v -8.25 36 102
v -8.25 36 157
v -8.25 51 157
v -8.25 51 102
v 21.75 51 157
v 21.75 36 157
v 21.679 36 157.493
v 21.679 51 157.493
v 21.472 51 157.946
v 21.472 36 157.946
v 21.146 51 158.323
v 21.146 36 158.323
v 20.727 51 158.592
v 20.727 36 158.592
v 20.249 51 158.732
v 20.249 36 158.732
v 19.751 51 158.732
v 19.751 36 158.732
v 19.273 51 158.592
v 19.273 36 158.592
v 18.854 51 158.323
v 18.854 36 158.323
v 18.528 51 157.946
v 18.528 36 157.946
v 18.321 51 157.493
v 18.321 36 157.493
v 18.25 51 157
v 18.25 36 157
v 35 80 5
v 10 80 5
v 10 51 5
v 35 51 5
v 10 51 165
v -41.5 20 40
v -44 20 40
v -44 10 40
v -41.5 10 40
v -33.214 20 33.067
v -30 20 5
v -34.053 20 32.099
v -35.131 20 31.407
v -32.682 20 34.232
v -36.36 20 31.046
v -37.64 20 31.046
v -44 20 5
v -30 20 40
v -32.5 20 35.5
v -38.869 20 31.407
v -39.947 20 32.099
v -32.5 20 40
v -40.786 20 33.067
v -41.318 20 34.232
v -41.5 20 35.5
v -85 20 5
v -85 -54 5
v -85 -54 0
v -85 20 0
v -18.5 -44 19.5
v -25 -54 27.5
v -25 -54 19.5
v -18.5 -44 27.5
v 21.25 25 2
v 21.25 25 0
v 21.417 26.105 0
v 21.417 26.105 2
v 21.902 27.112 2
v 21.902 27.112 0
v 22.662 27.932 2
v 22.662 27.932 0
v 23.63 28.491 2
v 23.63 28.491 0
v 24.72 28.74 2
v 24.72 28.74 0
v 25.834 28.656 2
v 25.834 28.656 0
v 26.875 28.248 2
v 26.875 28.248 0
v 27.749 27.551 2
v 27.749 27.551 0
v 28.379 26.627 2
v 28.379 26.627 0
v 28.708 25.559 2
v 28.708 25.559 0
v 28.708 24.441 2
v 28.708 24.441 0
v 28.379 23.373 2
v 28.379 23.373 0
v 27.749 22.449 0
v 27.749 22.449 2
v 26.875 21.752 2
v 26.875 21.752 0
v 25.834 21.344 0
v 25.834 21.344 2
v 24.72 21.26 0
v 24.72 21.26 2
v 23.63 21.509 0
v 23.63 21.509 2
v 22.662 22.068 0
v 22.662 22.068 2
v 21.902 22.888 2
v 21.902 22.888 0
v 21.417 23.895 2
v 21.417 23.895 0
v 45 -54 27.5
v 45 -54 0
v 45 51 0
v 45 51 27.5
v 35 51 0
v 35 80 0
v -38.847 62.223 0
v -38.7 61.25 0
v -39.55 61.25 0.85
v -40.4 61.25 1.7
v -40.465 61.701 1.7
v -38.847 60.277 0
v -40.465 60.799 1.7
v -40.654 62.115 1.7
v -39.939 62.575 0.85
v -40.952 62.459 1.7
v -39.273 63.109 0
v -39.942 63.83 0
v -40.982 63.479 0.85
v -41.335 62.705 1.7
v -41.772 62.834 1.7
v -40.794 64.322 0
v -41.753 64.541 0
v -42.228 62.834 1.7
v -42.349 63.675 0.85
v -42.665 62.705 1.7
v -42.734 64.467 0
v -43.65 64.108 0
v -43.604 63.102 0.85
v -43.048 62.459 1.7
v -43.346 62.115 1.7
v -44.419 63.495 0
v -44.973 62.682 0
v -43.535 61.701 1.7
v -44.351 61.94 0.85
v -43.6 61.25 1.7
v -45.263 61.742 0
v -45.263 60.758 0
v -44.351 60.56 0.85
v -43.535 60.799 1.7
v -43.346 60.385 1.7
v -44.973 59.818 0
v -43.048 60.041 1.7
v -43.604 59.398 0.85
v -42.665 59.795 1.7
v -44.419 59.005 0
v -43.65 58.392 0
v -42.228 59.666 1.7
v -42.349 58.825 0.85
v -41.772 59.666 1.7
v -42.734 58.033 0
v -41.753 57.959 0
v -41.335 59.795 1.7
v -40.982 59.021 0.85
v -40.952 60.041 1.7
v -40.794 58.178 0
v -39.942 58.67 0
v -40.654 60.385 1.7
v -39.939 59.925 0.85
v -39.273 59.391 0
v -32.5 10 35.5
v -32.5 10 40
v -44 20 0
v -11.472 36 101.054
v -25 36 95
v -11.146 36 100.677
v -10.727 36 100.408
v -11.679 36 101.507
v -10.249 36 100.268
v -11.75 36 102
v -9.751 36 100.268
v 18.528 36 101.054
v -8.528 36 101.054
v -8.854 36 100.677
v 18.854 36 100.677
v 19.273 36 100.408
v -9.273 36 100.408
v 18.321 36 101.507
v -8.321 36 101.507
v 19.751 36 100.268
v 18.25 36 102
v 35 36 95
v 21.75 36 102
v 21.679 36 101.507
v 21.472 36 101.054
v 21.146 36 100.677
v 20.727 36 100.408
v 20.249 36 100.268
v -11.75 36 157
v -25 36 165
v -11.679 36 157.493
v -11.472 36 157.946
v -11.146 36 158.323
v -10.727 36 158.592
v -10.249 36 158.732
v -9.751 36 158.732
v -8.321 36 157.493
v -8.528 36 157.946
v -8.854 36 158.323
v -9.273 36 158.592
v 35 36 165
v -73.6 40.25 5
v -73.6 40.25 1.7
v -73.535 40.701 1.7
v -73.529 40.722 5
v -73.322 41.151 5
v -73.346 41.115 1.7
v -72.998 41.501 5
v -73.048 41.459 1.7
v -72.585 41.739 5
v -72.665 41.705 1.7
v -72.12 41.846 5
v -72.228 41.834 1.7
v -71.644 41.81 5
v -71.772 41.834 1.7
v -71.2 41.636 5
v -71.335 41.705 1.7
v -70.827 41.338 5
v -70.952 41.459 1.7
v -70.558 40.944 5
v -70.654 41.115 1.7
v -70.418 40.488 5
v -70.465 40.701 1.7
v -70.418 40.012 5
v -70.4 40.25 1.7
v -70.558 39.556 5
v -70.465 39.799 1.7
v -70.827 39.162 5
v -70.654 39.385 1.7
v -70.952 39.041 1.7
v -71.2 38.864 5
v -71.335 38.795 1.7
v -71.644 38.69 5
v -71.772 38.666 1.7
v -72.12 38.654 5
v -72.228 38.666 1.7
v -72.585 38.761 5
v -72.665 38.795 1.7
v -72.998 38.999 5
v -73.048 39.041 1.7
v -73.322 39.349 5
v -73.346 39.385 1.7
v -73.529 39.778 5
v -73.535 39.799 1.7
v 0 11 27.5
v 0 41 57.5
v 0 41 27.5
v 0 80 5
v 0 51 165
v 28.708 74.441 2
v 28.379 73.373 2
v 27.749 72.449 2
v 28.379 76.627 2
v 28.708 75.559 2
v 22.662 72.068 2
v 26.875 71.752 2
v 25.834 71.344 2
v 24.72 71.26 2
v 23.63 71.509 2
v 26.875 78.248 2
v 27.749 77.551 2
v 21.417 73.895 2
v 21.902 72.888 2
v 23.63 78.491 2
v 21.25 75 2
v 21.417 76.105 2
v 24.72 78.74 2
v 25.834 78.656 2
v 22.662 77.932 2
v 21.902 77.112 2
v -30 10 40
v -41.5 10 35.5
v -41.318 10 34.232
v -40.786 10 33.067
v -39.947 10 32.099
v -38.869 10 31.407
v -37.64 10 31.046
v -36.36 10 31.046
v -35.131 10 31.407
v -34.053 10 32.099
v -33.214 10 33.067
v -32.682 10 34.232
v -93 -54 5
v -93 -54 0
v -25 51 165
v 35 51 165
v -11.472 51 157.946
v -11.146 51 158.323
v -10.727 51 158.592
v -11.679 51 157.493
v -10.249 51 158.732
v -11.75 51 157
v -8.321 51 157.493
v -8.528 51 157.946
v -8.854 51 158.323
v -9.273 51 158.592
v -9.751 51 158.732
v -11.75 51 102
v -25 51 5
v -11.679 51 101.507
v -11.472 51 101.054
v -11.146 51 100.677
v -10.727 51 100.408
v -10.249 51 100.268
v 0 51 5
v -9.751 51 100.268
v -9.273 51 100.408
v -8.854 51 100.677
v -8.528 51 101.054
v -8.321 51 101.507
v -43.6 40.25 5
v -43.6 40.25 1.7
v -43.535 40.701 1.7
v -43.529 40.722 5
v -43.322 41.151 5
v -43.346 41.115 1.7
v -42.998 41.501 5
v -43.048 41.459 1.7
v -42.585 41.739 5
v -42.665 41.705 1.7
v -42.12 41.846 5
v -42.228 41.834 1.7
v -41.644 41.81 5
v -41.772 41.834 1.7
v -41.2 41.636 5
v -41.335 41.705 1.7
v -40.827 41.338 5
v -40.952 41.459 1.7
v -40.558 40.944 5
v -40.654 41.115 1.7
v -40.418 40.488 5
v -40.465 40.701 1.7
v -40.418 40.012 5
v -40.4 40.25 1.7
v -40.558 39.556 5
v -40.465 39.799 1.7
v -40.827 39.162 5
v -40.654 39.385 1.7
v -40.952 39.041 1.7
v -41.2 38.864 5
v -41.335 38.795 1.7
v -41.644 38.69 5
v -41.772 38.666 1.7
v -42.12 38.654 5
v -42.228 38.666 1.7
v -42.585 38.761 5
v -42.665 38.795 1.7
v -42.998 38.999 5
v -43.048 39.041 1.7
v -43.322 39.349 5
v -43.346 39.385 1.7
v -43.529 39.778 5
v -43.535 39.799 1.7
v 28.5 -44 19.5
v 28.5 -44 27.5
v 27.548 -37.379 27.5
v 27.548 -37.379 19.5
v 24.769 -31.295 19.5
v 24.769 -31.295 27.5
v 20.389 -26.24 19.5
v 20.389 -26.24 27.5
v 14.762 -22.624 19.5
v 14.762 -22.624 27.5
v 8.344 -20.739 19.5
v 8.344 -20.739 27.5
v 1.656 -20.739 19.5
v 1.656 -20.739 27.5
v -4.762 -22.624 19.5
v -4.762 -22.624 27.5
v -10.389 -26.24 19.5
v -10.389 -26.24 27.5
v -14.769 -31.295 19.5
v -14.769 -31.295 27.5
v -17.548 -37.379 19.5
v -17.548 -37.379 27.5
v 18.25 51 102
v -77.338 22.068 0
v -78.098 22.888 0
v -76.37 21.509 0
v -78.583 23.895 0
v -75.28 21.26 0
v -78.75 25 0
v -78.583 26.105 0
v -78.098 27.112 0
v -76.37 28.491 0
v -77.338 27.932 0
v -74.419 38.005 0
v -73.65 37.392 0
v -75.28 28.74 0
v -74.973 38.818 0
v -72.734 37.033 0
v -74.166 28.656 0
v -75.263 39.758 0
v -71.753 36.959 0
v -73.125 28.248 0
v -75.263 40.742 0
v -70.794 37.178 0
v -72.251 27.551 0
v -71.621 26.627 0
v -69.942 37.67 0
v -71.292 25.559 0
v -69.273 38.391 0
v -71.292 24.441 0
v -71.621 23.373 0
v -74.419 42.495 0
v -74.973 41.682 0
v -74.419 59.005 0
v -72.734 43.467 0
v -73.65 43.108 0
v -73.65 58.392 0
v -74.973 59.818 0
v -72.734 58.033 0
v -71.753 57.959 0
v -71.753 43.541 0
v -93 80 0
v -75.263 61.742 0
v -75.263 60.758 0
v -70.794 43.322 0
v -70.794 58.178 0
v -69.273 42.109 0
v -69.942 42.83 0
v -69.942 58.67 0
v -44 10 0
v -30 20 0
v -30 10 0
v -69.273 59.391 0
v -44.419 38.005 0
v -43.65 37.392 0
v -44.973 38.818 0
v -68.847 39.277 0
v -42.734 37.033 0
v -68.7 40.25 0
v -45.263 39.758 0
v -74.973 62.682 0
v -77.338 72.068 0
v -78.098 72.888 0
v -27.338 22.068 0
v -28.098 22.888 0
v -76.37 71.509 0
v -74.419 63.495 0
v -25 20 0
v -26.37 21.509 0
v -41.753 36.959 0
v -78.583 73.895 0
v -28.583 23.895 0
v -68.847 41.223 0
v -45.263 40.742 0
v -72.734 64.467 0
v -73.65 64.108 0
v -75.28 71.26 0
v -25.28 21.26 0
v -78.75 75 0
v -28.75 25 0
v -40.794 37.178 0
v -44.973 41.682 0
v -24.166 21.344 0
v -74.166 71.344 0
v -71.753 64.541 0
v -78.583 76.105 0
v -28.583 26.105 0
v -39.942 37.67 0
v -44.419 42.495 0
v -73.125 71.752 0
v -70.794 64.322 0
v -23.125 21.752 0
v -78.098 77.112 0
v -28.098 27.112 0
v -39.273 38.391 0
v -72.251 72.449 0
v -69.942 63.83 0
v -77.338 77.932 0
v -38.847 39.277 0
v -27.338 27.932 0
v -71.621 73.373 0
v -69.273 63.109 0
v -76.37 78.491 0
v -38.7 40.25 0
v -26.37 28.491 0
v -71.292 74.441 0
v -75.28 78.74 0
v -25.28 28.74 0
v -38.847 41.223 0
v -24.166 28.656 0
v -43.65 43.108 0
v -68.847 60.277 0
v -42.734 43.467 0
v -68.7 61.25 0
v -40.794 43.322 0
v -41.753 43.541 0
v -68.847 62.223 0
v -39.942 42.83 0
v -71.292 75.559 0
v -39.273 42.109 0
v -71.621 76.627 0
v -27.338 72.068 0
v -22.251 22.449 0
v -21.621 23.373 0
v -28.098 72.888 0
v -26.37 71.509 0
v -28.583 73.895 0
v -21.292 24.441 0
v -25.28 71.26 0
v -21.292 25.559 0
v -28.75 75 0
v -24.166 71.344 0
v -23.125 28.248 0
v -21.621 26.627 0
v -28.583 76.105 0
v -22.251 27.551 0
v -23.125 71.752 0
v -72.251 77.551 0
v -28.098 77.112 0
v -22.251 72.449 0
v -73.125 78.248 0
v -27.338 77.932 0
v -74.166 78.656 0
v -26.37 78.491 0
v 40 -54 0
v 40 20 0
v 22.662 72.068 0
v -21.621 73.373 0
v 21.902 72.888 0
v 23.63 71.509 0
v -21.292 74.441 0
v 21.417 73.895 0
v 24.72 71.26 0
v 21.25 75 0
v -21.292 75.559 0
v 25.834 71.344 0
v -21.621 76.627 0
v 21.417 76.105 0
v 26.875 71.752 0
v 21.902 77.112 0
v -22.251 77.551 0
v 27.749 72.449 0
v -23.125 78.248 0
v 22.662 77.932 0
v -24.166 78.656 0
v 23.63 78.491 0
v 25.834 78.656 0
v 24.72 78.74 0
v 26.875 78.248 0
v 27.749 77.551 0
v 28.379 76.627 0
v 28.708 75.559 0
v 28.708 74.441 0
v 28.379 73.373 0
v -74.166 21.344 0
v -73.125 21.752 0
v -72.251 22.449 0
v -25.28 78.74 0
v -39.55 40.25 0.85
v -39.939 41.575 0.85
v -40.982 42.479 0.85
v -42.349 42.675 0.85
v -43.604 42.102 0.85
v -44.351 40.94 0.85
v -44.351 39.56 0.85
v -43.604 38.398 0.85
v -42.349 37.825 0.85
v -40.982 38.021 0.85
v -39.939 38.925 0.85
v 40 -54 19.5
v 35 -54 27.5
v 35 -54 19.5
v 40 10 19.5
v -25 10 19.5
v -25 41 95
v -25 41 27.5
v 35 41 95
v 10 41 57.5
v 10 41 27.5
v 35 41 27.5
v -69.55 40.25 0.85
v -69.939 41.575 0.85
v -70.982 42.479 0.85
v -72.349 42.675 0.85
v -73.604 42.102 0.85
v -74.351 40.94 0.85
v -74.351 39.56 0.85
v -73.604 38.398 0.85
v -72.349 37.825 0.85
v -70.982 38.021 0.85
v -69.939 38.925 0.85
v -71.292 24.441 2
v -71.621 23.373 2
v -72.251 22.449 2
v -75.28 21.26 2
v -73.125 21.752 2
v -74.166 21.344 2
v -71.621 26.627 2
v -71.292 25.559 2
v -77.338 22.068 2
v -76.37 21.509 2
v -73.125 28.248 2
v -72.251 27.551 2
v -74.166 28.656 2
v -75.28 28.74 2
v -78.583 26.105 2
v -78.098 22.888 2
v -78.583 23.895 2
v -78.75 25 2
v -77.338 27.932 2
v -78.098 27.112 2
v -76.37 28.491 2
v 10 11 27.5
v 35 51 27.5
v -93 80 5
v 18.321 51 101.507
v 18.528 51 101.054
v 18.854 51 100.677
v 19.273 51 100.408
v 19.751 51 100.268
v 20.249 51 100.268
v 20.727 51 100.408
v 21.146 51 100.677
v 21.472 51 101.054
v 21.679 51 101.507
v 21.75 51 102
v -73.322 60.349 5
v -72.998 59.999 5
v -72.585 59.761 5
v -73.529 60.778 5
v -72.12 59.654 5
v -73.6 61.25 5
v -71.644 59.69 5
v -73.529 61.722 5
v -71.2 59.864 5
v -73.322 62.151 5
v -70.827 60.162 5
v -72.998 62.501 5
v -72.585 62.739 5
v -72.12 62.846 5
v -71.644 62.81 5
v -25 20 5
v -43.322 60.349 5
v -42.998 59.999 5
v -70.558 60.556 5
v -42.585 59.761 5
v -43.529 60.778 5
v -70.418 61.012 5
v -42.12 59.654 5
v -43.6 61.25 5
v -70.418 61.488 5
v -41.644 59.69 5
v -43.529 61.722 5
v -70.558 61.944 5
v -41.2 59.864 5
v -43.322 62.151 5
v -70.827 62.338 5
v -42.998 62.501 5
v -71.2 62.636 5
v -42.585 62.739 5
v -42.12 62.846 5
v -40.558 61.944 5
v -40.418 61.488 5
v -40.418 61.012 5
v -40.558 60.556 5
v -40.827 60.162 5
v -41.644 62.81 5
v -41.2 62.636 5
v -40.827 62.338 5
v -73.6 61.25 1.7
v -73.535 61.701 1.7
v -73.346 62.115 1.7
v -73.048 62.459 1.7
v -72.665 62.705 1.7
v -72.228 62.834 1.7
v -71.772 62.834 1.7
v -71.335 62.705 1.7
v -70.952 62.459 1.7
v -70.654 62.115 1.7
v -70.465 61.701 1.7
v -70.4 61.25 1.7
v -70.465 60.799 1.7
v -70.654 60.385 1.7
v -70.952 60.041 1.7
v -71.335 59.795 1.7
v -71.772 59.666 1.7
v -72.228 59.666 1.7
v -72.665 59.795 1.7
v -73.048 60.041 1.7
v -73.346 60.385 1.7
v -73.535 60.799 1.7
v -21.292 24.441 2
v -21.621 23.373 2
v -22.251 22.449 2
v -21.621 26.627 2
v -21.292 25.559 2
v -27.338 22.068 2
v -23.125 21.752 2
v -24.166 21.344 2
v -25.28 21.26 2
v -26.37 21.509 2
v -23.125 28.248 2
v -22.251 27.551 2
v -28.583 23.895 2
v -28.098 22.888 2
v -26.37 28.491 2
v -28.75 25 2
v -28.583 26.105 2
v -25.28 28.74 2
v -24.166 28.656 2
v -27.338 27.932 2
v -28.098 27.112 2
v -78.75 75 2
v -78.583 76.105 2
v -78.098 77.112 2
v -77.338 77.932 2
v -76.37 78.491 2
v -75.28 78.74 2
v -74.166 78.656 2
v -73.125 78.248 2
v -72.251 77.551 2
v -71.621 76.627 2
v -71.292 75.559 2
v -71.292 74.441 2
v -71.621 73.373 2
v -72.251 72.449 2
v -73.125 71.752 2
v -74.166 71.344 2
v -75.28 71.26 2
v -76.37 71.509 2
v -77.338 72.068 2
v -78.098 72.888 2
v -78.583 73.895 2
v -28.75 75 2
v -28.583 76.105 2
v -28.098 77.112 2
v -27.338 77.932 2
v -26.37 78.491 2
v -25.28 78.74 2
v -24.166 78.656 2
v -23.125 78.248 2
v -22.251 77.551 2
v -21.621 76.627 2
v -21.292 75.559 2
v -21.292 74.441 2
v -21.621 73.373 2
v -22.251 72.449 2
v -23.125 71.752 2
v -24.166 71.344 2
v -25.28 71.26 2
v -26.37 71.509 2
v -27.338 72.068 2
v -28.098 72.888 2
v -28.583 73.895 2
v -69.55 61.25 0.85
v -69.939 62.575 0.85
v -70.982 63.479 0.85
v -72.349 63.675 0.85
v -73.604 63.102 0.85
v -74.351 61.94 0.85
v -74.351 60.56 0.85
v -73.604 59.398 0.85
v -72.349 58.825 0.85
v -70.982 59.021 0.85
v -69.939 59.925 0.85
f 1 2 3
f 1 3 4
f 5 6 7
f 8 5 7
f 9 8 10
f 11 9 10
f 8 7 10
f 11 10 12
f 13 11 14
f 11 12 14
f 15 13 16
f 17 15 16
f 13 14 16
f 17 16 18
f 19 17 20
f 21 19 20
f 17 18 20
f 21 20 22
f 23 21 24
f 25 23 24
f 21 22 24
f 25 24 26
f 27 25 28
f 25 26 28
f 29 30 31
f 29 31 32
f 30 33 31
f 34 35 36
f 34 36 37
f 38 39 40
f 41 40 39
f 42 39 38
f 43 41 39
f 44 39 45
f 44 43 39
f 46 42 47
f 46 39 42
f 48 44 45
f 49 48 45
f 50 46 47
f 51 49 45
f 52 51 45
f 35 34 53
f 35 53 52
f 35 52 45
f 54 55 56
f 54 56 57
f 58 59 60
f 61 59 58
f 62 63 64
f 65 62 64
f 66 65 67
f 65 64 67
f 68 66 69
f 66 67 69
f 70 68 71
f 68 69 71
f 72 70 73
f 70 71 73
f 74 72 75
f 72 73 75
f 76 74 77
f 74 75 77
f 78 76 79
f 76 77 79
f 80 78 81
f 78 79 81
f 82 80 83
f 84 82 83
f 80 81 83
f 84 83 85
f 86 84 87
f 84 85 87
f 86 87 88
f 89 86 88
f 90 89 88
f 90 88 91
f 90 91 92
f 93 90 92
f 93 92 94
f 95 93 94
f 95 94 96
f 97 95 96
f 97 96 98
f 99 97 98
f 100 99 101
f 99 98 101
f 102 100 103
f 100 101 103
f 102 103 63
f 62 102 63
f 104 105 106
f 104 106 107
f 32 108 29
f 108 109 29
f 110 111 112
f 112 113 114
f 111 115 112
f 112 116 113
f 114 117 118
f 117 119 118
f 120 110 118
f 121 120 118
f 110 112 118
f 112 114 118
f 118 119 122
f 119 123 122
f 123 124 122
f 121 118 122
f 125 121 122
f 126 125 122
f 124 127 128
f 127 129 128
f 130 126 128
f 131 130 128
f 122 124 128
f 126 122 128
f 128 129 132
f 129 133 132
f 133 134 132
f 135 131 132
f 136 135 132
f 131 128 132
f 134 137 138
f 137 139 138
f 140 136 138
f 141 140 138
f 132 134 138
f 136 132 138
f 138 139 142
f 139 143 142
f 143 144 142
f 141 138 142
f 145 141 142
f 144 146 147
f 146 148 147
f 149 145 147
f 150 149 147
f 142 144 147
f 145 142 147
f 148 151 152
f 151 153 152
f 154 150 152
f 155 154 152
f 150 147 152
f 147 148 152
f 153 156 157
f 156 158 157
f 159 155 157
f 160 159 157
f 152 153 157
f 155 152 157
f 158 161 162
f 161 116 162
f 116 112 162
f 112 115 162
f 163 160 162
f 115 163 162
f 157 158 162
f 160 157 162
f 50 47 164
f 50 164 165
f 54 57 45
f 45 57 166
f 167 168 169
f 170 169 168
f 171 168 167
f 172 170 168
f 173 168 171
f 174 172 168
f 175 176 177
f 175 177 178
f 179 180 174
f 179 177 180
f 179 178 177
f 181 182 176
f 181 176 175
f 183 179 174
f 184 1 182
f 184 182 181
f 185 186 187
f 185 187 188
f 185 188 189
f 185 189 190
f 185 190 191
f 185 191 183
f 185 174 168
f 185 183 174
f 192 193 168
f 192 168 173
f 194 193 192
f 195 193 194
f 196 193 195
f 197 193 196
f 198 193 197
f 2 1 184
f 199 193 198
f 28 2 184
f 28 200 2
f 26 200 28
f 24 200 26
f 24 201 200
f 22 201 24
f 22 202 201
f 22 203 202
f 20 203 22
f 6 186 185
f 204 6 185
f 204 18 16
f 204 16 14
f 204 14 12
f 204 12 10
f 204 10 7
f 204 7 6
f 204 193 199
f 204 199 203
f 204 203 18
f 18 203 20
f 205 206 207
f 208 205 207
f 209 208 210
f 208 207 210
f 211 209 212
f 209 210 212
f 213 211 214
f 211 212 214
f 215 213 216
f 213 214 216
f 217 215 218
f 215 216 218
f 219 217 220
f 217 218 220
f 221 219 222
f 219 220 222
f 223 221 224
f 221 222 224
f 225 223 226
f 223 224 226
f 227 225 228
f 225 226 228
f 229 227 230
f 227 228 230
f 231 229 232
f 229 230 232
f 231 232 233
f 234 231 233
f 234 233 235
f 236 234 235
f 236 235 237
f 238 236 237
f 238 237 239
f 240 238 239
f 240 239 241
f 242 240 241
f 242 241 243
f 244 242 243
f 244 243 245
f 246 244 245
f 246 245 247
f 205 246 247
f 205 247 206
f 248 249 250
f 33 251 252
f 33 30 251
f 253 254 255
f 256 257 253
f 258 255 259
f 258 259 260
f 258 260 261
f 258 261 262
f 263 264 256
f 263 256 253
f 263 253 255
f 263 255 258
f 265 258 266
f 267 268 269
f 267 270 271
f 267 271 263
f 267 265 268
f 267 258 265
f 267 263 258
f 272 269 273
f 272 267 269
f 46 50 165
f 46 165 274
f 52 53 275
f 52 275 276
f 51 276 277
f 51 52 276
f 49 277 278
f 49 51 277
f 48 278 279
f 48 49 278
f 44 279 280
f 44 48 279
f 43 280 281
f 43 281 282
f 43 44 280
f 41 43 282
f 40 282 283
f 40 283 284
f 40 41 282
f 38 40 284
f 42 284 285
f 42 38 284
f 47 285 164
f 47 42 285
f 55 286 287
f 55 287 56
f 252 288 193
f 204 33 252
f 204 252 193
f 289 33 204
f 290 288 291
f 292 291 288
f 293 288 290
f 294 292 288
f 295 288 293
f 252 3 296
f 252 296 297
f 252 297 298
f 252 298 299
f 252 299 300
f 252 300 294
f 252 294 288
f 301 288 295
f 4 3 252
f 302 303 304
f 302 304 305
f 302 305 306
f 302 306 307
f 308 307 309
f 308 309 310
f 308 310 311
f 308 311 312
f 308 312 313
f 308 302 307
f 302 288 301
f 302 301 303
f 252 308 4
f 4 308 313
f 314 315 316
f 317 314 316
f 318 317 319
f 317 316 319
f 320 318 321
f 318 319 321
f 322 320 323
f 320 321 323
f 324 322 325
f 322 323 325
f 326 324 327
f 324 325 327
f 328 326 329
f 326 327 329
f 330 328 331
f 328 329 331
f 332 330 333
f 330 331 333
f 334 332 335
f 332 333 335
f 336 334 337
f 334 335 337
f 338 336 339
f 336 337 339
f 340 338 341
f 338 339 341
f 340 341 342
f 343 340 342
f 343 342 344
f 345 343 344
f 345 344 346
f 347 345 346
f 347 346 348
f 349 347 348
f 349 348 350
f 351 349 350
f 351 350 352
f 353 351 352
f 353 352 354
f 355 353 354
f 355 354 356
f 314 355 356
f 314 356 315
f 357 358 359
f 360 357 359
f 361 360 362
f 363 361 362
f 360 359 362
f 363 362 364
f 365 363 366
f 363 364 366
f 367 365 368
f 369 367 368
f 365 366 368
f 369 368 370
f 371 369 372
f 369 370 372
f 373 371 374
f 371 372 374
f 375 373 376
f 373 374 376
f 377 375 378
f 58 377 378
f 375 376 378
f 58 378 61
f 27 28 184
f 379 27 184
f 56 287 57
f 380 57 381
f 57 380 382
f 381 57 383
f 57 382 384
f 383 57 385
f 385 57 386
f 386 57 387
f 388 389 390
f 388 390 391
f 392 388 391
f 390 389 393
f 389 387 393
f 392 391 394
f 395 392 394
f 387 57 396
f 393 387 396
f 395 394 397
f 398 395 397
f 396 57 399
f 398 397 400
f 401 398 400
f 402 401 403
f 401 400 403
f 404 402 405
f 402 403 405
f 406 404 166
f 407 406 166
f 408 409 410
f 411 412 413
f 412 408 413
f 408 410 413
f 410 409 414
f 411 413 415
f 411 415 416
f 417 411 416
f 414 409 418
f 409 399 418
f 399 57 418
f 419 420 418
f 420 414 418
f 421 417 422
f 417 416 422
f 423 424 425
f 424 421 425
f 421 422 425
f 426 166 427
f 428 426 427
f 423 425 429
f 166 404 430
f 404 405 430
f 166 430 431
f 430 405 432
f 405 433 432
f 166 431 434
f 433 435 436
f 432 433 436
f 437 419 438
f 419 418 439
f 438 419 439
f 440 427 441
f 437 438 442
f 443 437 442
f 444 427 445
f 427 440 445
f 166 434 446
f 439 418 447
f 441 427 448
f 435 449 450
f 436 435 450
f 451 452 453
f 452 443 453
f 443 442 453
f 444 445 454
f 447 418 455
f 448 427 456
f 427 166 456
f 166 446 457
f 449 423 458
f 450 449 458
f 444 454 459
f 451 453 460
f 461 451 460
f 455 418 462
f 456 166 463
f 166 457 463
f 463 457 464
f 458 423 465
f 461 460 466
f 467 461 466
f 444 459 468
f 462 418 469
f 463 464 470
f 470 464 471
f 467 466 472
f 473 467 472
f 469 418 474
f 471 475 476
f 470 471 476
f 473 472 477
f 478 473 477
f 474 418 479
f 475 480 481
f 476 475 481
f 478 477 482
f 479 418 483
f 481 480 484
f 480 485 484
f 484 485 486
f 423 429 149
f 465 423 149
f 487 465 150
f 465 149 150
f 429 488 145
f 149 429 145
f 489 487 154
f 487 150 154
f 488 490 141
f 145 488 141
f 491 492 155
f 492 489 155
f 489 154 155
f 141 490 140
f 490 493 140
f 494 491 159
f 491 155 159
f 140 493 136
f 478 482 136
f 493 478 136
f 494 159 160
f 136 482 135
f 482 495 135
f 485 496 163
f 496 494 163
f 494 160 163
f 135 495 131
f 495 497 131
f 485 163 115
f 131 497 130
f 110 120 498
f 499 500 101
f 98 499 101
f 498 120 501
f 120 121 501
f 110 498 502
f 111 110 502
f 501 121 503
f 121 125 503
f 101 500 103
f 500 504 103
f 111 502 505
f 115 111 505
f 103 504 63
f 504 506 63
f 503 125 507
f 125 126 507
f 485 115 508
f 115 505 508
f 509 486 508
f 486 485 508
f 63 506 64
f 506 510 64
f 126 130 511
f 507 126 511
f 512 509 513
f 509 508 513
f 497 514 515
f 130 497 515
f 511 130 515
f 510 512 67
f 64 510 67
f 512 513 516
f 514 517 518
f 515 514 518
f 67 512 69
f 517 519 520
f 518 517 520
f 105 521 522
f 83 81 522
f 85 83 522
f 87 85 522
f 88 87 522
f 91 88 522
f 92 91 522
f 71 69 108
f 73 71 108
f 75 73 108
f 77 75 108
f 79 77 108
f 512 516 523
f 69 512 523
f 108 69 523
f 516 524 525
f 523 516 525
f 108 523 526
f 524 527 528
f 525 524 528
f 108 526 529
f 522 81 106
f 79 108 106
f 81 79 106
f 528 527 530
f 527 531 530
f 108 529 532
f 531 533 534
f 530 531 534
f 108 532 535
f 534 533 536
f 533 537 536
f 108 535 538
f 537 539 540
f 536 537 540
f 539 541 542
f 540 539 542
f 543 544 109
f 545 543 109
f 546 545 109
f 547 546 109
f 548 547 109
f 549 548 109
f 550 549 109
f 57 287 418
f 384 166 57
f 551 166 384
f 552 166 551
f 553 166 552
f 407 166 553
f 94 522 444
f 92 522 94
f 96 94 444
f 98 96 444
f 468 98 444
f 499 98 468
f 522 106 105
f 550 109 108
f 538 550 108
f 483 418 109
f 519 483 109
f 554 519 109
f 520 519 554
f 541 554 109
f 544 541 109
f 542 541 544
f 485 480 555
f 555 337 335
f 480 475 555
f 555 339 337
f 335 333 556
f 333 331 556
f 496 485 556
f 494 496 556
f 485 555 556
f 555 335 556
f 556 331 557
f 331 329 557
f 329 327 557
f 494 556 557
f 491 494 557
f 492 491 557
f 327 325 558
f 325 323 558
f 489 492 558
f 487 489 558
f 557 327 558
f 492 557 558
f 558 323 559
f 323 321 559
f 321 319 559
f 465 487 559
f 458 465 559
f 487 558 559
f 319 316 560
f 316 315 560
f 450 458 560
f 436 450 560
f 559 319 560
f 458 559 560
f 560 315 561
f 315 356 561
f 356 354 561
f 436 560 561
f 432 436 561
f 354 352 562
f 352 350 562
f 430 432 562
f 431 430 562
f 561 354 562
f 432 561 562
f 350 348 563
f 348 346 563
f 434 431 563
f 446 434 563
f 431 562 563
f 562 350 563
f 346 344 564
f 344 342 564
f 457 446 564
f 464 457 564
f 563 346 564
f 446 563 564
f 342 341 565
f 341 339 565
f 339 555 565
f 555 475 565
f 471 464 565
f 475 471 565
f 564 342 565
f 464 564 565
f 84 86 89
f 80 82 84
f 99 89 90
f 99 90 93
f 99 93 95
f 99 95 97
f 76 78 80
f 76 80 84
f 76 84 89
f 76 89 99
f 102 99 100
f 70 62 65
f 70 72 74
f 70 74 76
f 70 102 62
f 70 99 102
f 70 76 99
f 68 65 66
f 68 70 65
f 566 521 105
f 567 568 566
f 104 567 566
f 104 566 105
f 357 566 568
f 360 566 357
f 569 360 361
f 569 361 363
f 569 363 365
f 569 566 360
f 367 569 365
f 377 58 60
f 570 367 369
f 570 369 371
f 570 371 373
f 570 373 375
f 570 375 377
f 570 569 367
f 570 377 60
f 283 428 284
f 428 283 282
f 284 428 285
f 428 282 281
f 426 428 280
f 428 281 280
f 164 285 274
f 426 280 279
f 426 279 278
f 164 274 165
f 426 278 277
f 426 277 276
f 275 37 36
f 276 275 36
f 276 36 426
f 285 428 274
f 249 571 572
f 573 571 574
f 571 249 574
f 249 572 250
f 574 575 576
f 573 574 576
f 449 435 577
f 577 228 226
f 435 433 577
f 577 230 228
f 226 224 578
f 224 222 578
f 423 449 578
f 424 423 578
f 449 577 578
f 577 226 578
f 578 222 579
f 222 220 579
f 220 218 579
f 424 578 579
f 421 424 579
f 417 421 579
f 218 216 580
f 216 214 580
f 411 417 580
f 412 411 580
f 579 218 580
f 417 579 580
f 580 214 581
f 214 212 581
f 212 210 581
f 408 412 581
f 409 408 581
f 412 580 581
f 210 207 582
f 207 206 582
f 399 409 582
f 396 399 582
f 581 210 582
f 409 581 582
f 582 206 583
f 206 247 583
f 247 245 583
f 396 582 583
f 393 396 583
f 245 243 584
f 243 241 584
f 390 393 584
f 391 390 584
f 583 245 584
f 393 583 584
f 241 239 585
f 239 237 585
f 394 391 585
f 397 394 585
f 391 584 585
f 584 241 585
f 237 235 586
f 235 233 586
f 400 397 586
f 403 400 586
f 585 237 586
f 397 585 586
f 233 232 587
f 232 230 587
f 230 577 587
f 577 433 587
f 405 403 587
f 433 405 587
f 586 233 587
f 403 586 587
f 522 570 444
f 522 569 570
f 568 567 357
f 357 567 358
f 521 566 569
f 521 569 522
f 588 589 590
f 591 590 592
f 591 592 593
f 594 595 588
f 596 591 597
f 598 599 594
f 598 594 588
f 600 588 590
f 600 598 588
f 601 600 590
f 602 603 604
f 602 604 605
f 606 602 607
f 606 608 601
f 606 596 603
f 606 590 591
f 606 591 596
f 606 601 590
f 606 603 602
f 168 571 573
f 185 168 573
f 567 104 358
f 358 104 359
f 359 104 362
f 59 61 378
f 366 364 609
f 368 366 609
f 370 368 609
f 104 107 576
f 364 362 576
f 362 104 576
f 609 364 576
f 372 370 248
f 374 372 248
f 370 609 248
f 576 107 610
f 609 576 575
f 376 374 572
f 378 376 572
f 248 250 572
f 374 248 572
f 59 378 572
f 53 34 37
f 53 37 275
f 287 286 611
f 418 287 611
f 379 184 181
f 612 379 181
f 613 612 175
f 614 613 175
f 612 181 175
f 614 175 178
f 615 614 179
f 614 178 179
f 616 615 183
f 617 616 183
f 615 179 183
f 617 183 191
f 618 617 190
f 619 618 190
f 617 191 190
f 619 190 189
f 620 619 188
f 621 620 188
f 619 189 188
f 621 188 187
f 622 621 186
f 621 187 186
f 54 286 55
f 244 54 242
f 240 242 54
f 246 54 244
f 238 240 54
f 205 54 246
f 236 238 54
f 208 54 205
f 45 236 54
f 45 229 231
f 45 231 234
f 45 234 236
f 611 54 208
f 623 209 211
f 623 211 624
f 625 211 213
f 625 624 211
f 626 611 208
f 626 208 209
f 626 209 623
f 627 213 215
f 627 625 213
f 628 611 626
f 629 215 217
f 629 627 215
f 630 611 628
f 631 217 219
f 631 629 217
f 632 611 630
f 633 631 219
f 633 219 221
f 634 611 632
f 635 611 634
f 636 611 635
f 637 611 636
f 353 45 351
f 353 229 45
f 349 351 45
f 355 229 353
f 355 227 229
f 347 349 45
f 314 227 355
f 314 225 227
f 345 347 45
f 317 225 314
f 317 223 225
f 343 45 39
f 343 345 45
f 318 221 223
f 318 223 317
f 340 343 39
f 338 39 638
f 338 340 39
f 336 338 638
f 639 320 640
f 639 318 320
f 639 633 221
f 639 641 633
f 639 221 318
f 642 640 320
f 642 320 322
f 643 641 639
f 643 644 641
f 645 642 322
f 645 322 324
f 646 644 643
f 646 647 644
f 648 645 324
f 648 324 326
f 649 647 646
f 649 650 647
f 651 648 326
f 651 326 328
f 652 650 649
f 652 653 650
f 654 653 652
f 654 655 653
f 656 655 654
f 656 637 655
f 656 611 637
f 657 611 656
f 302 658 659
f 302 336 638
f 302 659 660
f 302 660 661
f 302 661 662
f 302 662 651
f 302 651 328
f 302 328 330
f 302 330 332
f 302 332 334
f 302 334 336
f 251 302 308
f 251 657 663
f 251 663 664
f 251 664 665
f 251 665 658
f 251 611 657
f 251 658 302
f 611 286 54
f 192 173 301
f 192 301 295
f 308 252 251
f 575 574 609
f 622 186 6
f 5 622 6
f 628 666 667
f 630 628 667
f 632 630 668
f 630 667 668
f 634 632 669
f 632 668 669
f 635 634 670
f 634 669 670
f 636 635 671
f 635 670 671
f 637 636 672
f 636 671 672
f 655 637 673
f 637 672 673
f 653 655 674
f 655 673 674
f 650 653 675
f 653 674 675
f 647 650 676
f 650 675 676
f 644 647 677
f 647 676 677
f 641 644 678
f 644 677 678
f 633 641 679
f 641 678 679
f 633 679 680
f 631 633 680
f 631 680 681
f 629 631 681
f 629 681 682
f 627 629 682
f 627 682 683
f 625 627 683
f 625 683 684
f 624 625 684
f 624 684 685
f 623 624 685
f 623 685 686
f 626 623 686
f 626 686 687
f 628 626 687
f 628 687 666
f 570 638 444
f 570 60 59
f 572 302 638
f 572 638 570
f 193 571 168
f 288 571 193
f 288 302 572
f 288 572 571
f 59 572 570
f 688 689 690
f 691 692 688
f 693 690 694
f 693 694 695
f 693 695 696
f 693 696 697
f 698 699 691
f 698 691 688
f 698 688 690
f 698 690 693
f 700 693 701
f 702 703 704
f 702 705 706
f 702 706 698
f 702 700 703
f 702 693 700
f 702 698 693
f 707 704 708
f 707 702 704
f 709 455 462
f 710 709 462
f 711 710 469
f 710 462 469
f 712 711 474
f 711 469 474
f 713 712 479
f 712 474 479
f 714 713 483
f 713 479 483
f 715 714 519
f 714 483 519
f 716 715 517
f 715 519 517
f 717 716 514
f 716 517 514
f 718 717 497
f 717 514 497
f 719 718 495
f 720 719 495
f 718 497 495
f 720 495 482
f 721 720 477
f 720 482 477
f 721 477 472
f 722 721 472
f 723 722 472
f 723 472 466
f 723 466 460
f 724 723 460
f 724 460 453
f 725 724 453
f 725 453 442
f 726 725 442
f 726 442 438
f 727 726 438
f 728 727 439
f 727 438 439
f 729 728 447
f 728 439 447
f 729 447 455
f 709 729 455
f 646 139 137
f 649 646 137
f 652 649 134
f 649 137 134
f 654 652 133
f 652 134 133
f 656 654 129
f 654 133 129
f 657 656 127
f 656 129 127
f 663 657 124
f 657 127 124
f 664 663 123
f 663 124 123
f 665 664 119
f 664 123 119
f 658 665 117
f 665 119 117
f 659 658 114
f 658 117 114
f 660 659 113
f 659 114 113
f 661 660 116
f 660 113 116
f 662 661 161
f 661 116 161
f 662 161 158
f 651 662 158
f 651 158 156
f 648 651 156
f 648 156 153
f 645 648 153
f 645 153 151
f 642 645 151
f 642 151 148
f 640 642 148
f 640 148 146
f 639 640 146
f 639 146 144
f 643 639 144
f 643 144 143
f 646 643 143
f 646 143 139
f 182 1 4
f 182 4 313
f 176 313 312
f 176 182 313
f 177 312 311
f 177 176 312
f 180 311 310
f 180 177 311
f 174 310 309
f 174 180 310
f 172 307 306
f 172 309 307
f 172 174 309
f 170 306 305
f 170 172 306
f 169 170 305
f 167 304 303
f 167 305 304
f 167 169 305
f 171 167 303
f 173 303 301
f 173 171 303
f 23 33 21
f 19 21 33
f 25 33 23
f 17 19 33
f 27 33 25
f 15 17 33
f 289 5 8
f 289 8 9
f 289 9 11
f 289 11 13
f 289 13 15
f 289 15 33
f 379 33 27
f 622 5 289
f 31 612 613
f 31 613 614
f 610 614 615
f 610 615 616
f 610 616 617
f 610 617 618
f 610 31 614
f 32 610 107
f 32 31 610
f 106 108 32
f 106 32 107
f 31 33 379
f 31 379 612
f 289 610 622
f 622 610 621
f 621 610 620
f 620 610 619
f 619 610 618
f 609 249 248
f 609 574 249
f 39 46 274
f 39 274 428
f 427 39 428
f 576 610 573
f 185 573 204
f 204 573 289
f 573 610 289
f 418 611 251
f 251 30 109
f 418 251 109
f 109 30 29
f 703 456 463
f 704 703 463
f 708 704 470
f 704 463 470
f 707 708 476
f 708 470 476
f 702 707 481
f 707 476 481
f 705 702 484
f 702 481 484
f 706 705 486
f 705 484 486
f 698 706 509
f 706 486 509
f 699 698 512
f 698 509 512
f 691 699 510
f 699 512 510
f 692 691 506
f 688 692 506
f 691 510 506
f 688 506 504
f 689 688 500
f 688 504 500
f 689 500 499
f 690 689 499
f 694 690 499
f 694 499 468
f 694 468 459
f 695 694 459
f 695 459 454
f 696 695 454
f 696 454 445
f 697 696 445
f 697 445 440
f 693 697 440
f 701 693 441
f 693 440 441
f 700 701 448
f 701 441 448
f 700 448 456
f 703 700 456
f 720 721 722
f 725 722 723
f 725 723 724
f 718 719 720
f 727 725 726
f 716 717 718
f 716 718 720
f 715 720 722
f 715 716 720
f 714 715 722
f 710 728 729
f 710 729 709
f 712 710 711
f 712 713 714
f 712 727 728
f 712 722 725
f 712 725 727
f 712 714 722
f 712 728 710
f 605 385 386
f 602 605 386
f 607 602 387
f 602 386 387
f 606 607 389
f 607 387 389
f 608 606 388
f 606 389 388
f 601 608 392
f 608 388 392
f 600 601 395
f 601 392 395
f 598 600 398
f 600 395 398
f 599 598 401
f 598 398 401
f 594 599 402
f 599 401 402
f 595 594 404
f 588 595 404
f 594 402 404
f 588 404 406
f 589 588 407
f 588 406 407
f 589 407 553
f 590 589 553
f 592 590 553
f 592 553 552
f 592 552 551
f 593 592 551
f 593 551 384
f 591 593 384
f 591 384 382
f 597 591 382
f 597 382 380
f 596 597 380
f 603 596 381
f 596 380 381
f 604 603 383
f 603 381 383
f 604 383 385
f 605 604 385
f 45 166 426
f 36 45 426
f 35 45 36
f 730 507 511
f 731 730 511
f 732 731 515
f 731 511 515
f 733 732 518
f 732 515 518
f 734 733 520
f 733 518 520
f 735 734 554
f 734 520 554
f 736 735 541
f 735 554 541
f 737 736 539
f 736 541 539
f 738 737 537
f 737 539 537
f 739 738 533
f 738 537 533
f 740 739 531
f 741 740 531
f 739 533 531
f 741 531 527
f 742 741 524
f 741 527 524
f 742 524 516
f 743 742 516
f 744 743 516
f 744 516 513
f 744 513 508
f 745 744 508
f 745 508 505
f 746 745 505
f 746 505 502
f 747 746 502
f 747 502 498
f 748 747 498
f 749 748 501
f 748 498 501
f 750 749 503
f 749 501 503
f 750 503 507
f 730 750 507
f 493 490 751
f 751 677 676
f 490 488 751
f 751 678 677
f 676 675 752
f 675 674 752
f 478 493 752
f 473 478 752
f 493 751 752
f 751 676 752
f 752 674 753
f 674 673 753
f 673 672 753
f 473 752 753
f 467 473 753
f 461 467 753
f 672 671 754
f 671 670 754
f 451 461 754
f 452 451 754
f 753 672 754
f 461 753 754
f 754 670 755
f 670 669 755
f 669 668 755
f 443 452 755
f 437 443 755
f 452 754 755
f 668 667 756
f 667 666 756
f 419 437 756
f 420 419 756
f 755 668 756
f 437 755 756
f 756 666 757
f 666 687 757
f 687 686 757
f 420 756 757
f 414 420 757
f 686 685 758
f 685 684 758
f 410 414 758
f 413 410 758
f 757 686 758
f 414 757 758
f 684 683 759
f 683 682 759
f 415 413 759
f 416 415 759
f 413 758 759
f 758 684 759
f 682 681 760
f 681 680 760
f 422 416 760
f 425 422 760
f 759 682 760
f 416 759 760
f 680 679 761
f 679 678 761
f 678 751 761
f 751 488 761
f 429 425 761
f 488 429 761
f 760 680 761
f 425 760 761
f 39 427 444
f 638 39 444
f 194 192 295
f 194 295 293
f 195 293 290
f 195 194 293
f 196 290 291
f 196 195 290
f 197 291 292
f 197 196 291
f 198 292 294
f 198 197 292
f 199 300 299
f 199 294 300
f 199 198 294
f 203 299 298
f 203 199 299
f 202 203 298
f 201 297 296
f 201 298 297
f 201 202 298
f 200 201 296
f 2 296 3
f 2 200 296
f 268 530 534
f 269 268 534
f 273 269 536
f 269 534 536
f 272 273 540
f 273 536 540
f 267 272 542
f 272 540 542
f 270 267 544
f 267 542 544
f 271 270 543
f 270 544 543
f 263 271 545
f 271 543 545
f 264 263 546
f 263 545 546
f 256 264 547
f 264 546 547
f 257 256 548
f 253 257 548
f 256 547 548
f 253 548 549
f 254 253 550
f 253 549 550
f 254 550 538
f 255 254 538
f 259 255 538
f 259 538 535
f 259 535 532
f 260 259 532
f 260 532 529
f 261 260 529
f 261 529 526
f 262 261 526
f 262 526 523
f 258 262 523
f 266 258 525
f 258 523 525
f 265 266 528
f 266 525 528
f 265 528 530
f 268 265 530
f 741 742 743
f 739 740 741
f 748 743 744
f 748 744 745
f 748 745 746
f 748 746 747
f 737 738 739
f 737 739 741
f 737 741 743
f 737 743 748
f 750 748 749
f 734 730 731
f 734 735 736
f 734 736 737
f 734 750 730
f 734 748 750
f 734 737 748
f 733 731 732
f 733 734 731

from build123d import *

# Parameters (mm, degrees)
SKETCH_1_W                   = 120
SKETCH_1_H                   = 60
EXTRUDE_1_DEPTH              = 5
SKETCH_3_W                   = 60
SKETCH_3_H                   = 8
EXTRUDE_3_DEPTH              = 60
EXTRUDE_6_DEPTH              = 10
SKETCH_11_R                  = 1.6
CUT_EXTRUDE_3_DEPTH          = 124.668912828
SKETCH_12_R                  = 1.6
CUT_EXTRUDE_4_DEPTH          = 134.603892159
SKETCH_18_R                  = 3.75
CUT_EXTRUDE_7_DEPTH          = 2
SKETCH_20_W                  = 60
SKETCH_20_H                  = 90
EXTRUDE_8_DEPTH              = 8
SKETCH_22_W                  = 60
SKETCH_22_H                  = 50
EXTRUDE_9_DEPTH              = 5
CUT_EXTRUDE_8_DEPTH          = 191.131533418
CUT_EXTRUDE_8_DEPTH_BACK     = 191.131533418
SKETCH_23_W                  = 60
SKETCH_23_H                  = 10
EXTRUDE_10_DEPTH             = 160
CUT_EXTRUDE_9_DEPTH          = 190.660222503
SKETCH_25_W                  = 150
SKETCH_25_H                  = 13
CUT_EXTRUDE_10_DEPTH         = 193.937813816
SKETCH_26_W                  = 60
SKETCH_26_H                  = 8
EXTRUDE_11_DEPTH             = 85
SKETCH_27_R                  = 23.5
CUT_EXTRUDE_11_DEPTH         = 181.364214854
EXTRUDE_12_DEPTH             = 8
SKETCH_29_W                  = 60
SKETCH_29_H                  = 70
EXTRUDE_13_DEPTH             = 5
CUT_EXTRUDE_12_DEPTH         = 207.276513447
HOLE_WIZARD_M3_1_D           = 3.2
HOLE_WIZARD_M3_1_CSINK_D     = 6.6
HOLE_WIZARD_M3_1_CSINK_ANGLE = 90
SKETCH_33_W                  = 14.5
SKETCH_33_H                  = 21
EXTRUDE_14_DEPTH             = 60
EXTRUDE_15_DEPTH             = 60
EXTRUDE_18_DEPTH             = 5
EXTRUDE_19_DEPTH             = 5
SKETCH_38_W                  = 10
SKETCH_38_H                  = 105
EXTRUDE_20_DEPTH             = 8
SKETCH_40_W                  = 10
SKETCH_40_H                  = 19.5
EXTRUDE_21_DEPTH             = 105
CUT_EXTRUDE_13_DEPTH         = 5
SKETCH_42_W                  = 8
SKETCH_42_H                  = 134
EXTRUDE_22_DEPTH             = 5
EXTRUDE_17_DEPTH             = 5


with BuildPart() as part:
    # 草图1 → 凸台-拉伸1 (new body)
    with BuildSketch(Plane.XY):
        with Locations((-25, 50)):
            Rectangle(SKETCH_1_W, SKETCH_1_H)
    extrude(amount=EXTRUDE_1_DEPTH)

    # 草图3 → 凸台-拉伸3 (add)
    with BuildSketch(Plane.XY.offset(5)):
        with Locations((5, 76)):
            Rectangle(SKETCH_3_W, SKETCH_3_H)
    extrude(amount=EXTRUDE_3_DEPTH)

    # 草图9 → 凸台-拉伸6 (add)
    with BuildSketch(Plane.XZ.offset(-20)):
        with BuildLine():
            Line((-32.5, 0), (-41.5, 0))
            Line((-41.5, 0), (-44, 0))
            Line((-44, 0), (-44, 40))
            Line((-44, 40), (-41.5, 40))
            Line((-41.5, 40), (-41.5, 35.5))
            ThreePointArc((-41.5, 35.5), (-37, 31), (-32.5, 35.5))
            Line((-32.5, 35.5), (-32.5, 40))
            Line((-32.5, 40), (-30, 40))
            Line((-30, 40), (-30, 0))
            Line((-30, 0), (-32.5, 0))
        make_face()
    extrude(amount=EXTRUDE_6_DEPTH)

    # 草图11 → 切除-拉伸3 (cut, through all)
    with BuildSketch(Plane(origin=(0, 72, 0), x_dir=(-1, 0, 0), z_dir=(0, -1, 0))):
        with Locations(Location((-20, -52.088110118, 0), (0, 0, 90))):
            Circle(SKETCH_11_R)
        with Locations(Location((10, -28.088110118, 0), (0, 0, 90))):
            Circle(SKETCH_11_R)
        with Locations(Location((-20, -28.088110118, 0), (0, 0, 90))):
            Circle(SKETCH_11_R)
        with Locations(Location((10, -52.088110118, 0), (0, 0, 90))):
            Circle(SKETCH_11_R)
    extrude(amount=-CUT_EXTRUDE_3_DEPTH, mode=Mode.SUBTRACT)

    # 草图12 → 切除-拉伸4 (cut, through all)
    with BuildSketch(Plane(origin=(0, 0, 0), x_dir=(-1, 0, 0), z_dir=(0, 0, -1))):
        with Locations((42, 40.25)):
            Circle(SKETCH_12_R)
        with Locations((42, 61.25)):
            Circle(SKETCH_12_R)
        with Locations((72, 40.25)):
            Circle(SKETCH_12_R)
        with Locations((72, 61.25)):
            Circle(SKETCH_12_R)
    extrude(amount=-CUT_EXTRUDE_4_DEPTH, mode=Mode.SUBTRACT)

    # 草图18 → 切除-拉伸7 (cut)
    with BuildSketch(Plane(origin=(0, 0, 0), x_dir=(-1, 0, 0), z_dir=(0, 0, -1))):
        with Locations((75, 75)):
            Circle(SKETCH_18_R)
        with Locations((25, 75)):
            Circle(SKETCH_18_R)
        with Locations((-25, 75)):
            Circle(SKETCH_18_R)
        with Locations((-25, 25)):
            Circle(SKETCH_18_R)
        with Locations((25, 25)):
            Circle(SKETCH_18_R)
        with Locations((75, 25)):
            Circle(SKETCH_18_R)
    extrude(amount=-CUT_EXTRUDE_7_DEPTH, mode=Mode.SUBTRACT)

    # 草图20 → 凸台-拉伸8 (add)
    with BuildSketch(Plane(origin=(0, 80, 0), x_dir=(1, 0, 0), z_dir=(0, 1, 0))):
        with Locations((5, -110)):
            Rectangle(SKETCH_20_W, SKETCH_20_H)
    extrude(amount=-EXTRUDE_8_DEPTH)

    # 草图22 → 凸台-拉伸9 (add)
    with BuildSketch(Plane.XZ.offset(-72)):
        with Locations((5, 130)):
            Rectangle(SKETCH_22_W, SKETCH_22_H)
    extrude(amount=EXTRUDE_9_DEPTH)

    # 草图21 → 切除-拉伸8 (cut, two sides: drawn at the far end of the back side and taken through both)
    with BuildSketch(Plane(origin=(0, 80, 0), x_dir=(1, 0, 0), z_dir=(0, 1, 0)).offset(-CUT_EXTRUDE_8_DEPTH_BACK)):
        with BuildLine():
            Line((21.75, -115), (21.75, -145))
            ThreePointArc((21.75, -145), (20, -146.75), (18.25, -145))
            Line((18.25, -145), (18.25, -115))
            ThreePointArc((18.25, -115), (20, -113.25), (21.75, -115))
        make_face()
        with BuildLine():
            Line((-11.75, -115), (-11.75, -145))
            ThreePointArc((-11.75, -145), (-10, -146.75), (-8.25, -145))
            Line((-8.25, -145), (-8.25, -115))
            ThreePointArc((-8.25, -115), (-10, -113.25), (-11.75, -115))
        make_face()
    extrude(amount=CUT_EXTRUDE_8_DEPTH + CUT_EXTRUDE_8_DEPTH_BACK, mode=Mode.SUBTRACT)

    # 草图23 → 凸台-拉伸10 (add)
    with BuildSketch(Plane.XY.offset(5)):
        with Locations((5, 46)):
            Rectangle(SKETCH_23_W, SKETCH_23_H)
    extrude(amount=EXTRUDE_10_DEPTH)

    # 草图24 → 切除-拉伸9 (cut, through all)
    with BuildSketch(Plane.XZ.offset(-41)):
        with BuildLine():
            Line((-8.25, 157), (-8.25, 102))
            ThreePointArc((-8.25, 102), (-10, 100.25), (-11.75, 102))
            Line((-11.75, 102), (-11.75, 157))
            ThreePointArc((-11.75, 157), (-10, 158.75), (-8.25, 157))
        make_face()
        with BuildLine():
            Line((18.25, 157), (18.25, 102))
            ThreePointArc((18.25, 102), (20, 100.25), (21.75, 102))
            Line((21.75, 102), (21.75, 157))
            ThreePointArc((21.75, 157), (20, 158.75), (18.25, 157))
        make_face()
    extrude(amount=-CUT_EXTRUDE_9_DEPTH, mode=Mode.SUBTRACT)

    # 草图25 → 切除-拉伸10 (cut, through all)
    with BuildSketch(Plane.ZY.offset(25)):
        with Locations((80, 73.5)):
            Rectangle(SKETCH_25_W, SKETCH_25_H)
    extrude(amount=-CUT_EXTRUDE_10_DEPTH, mode=Mode.SUBTRACT)

    # 草图26 → 凸台-拉伸11 (add)
    with BuildSketch(Plane.XZ.offset(-41)):
        with Locations((5, 23.5)):
            Rectangle(SKETCH_26_W, SKETCH_26_H)
    extrude(amount=EXTRUDE_11_DEPTH)

    # 草图27 → 切除-拉伸11 (cut, through all)
    with BuildSketch(Plane.XY.offset(27.5)):
        with Locations((5, -44)):
            Circle(SKETCH_27_R)
    extrude(amount=-CUT_EXTRUDE_11_DEPTH, mode=Mode.SUBTRACT)

    # 草图28 → 凸台-拉伸12 (add)
    with BuildSketch(Plane.XY.offset(27.5)):
        Polygon((35, -44), (35, -54), (28.5, -44), align=None)
        Polygon((-25, -44), (-25, -54), (-18.5, -44), align=None)
    extrude(amount=-EXTRUDE_12_DEPTH)

    # 草图29 → 凸台-拉伸13 (add)
    with BuildSketch(Plane.XZ.offset(-41)):
        with Locations((5, 130)):
            Rectangle(SKETCH_29_W, SKETCH_29_H)
    extrude(amount=EXTRUDE_13_DEPTH)

    # 草图30 → 切除-拉伸12 (cut, through all)
    with BuildSketch(Plane.XZ.offset(-36)):
        with BuildLine():
            Line((18.25, 102), (18.25, 157))
            ThreePointArc((18.25, 157), (20, 158.75), (21.75, 157))
            Line((21.75, 157), (21.75, 102))
            ThreePointArc((21.75, 102), (20, 100.25), (18.25, 102))
        make_face()
        with BuildLine():
            Line((-8.25, 102), (-8.25, 157))
            ThreePointArc((-8.25, 157), (-10, 158.75), (-11.75, 157))
            Line((-11.75, 157), (-11.75, 102))
            ThreePointArc((-11.75, 102), (-10, 100.25), (-8.25, 102))
        make_face()
    extrude(amount=-CUT_EXTRUDE_12_DEPTH, mode=Mode.SUBTRACT)

    # M3 十字槽沉头木螺钉的锥形沉头孔1 (through all)
    with Locations(Plane(origin=(0, 0, 0), x_dir=(-1, 0, 0), z_dir=(0, 0, -1))):
        with Locations((42, 61.25), (72, 61.25), (72, 40.25), (42, 40.25)):
            CounterSinkHole(HOLE_WIZARD_M3_1_D / 2, HOLE_WIZARD_M3_1_CSINK_D / 2, counter_sink_angle=HOLE_WIZARD_M3_1_CSINK_ANGLE)

    # 草图33 → 凸台-拉伸14 (add)
    with BuildSketch(Plane(origin=(35, 0, 0), x_dir=(0, 0, -1), z_dir=(1, 0, 0))):
        with Locations((-12.25, 30.5)):
            Rectangle(SKETCH_33_W, SKETCH_33_H)
    extrude(amount=-EXTRUDE_14_DEPTH)

    # 草图34 → 凸台-拉伸15 (add)
    with BuildSketch(Plane(origin=(35, 0, 0), x_dir=(0, 0, -1), z_dir=(1, 0, 0))):
        Polygon((-19.5, 10), (0, 20), (-19.5, 20), align=None)
    extrude(amount=-EXTRUDE_15_DEPTH)

    # 草图35 → 凸台-拉伸18 (add, symmetric)
    with BuildSketch(Plane(origin=(5, 0, 0), x_dir=(0, 0, -1), z_dir=(1, 0, 0))):
        Polygon((-57.5, 41), (-27.5, 11), (-27.5, 41), align=None)
    extrude(amount=EXTRUDE_18_DEPTH, both=True)

    # 草图37 → 凸台-拉伸19 (add, symmetric)
    with BuildSketch(Plane(origin=(5, 0, 0), x_dir=(0, 0, -1), z_dir=(1, 0, 0))):
        Polygon((-5, 80), (-165, 51), (-5, 51), align=None)
    extrude(amount=EXTRUDE_19_DEPTH, both=True)

    # 草图38 → 凸台-拉伸20 (add)
    with BuildSketch(Plane.XY.offset(27.5)):
        with Locations((40, -1.5)):
            Rectangle(SKETCH_38_W, SKETCH_38_H)
    extrude(amount=-EXTRUDE_20_DEPTH)

    # 草图40 → 凸台-拉伸21 (add)
    with BuildSketch(Plane.XZ.offset(54)):
        with Locations((40, 9.75)):
            Rectangle(SKETCH_40_W, SKETCH_40_H)
    extrude(amount=-EXTRUDE_21_DEPTH)

    # 草图41 → 切除-拉伸13 (cut)
    with BuildSketch(Plane.ZY.offset(-35)):
        Polygon((0, 20), (19.5, 10), (19.5, -54), (0, -54), align=None)
    extrude(amount=-CUT_EXTRUDE_13_DEPTH, mode=Mode.SUBTRACT)

    # 草图42 → 凸台-拉伸22 (add)
    with BuildSketch(Plane.XY.offset(5)):
        with Locations((-89, 13)):
            Rectangle(SKETCH_42_W, SKETCH_42_H)
    extrude(amount=-EXTRUDE_22_DEPTH)

    # 草图36 → 凸台-拉伸17 (add, symmetric)
    with BuildSketch(Plane(origin=(5, 0, 0), x_dir=(0, 0, -1), z_dir=(1, 0, 0))):
        Polygon((-5, 80), (-165, 51), (-5, 51), align=None)
    extrude(amount=EXTRUDE_17_DEPTH, both=True)


solid = part.part
